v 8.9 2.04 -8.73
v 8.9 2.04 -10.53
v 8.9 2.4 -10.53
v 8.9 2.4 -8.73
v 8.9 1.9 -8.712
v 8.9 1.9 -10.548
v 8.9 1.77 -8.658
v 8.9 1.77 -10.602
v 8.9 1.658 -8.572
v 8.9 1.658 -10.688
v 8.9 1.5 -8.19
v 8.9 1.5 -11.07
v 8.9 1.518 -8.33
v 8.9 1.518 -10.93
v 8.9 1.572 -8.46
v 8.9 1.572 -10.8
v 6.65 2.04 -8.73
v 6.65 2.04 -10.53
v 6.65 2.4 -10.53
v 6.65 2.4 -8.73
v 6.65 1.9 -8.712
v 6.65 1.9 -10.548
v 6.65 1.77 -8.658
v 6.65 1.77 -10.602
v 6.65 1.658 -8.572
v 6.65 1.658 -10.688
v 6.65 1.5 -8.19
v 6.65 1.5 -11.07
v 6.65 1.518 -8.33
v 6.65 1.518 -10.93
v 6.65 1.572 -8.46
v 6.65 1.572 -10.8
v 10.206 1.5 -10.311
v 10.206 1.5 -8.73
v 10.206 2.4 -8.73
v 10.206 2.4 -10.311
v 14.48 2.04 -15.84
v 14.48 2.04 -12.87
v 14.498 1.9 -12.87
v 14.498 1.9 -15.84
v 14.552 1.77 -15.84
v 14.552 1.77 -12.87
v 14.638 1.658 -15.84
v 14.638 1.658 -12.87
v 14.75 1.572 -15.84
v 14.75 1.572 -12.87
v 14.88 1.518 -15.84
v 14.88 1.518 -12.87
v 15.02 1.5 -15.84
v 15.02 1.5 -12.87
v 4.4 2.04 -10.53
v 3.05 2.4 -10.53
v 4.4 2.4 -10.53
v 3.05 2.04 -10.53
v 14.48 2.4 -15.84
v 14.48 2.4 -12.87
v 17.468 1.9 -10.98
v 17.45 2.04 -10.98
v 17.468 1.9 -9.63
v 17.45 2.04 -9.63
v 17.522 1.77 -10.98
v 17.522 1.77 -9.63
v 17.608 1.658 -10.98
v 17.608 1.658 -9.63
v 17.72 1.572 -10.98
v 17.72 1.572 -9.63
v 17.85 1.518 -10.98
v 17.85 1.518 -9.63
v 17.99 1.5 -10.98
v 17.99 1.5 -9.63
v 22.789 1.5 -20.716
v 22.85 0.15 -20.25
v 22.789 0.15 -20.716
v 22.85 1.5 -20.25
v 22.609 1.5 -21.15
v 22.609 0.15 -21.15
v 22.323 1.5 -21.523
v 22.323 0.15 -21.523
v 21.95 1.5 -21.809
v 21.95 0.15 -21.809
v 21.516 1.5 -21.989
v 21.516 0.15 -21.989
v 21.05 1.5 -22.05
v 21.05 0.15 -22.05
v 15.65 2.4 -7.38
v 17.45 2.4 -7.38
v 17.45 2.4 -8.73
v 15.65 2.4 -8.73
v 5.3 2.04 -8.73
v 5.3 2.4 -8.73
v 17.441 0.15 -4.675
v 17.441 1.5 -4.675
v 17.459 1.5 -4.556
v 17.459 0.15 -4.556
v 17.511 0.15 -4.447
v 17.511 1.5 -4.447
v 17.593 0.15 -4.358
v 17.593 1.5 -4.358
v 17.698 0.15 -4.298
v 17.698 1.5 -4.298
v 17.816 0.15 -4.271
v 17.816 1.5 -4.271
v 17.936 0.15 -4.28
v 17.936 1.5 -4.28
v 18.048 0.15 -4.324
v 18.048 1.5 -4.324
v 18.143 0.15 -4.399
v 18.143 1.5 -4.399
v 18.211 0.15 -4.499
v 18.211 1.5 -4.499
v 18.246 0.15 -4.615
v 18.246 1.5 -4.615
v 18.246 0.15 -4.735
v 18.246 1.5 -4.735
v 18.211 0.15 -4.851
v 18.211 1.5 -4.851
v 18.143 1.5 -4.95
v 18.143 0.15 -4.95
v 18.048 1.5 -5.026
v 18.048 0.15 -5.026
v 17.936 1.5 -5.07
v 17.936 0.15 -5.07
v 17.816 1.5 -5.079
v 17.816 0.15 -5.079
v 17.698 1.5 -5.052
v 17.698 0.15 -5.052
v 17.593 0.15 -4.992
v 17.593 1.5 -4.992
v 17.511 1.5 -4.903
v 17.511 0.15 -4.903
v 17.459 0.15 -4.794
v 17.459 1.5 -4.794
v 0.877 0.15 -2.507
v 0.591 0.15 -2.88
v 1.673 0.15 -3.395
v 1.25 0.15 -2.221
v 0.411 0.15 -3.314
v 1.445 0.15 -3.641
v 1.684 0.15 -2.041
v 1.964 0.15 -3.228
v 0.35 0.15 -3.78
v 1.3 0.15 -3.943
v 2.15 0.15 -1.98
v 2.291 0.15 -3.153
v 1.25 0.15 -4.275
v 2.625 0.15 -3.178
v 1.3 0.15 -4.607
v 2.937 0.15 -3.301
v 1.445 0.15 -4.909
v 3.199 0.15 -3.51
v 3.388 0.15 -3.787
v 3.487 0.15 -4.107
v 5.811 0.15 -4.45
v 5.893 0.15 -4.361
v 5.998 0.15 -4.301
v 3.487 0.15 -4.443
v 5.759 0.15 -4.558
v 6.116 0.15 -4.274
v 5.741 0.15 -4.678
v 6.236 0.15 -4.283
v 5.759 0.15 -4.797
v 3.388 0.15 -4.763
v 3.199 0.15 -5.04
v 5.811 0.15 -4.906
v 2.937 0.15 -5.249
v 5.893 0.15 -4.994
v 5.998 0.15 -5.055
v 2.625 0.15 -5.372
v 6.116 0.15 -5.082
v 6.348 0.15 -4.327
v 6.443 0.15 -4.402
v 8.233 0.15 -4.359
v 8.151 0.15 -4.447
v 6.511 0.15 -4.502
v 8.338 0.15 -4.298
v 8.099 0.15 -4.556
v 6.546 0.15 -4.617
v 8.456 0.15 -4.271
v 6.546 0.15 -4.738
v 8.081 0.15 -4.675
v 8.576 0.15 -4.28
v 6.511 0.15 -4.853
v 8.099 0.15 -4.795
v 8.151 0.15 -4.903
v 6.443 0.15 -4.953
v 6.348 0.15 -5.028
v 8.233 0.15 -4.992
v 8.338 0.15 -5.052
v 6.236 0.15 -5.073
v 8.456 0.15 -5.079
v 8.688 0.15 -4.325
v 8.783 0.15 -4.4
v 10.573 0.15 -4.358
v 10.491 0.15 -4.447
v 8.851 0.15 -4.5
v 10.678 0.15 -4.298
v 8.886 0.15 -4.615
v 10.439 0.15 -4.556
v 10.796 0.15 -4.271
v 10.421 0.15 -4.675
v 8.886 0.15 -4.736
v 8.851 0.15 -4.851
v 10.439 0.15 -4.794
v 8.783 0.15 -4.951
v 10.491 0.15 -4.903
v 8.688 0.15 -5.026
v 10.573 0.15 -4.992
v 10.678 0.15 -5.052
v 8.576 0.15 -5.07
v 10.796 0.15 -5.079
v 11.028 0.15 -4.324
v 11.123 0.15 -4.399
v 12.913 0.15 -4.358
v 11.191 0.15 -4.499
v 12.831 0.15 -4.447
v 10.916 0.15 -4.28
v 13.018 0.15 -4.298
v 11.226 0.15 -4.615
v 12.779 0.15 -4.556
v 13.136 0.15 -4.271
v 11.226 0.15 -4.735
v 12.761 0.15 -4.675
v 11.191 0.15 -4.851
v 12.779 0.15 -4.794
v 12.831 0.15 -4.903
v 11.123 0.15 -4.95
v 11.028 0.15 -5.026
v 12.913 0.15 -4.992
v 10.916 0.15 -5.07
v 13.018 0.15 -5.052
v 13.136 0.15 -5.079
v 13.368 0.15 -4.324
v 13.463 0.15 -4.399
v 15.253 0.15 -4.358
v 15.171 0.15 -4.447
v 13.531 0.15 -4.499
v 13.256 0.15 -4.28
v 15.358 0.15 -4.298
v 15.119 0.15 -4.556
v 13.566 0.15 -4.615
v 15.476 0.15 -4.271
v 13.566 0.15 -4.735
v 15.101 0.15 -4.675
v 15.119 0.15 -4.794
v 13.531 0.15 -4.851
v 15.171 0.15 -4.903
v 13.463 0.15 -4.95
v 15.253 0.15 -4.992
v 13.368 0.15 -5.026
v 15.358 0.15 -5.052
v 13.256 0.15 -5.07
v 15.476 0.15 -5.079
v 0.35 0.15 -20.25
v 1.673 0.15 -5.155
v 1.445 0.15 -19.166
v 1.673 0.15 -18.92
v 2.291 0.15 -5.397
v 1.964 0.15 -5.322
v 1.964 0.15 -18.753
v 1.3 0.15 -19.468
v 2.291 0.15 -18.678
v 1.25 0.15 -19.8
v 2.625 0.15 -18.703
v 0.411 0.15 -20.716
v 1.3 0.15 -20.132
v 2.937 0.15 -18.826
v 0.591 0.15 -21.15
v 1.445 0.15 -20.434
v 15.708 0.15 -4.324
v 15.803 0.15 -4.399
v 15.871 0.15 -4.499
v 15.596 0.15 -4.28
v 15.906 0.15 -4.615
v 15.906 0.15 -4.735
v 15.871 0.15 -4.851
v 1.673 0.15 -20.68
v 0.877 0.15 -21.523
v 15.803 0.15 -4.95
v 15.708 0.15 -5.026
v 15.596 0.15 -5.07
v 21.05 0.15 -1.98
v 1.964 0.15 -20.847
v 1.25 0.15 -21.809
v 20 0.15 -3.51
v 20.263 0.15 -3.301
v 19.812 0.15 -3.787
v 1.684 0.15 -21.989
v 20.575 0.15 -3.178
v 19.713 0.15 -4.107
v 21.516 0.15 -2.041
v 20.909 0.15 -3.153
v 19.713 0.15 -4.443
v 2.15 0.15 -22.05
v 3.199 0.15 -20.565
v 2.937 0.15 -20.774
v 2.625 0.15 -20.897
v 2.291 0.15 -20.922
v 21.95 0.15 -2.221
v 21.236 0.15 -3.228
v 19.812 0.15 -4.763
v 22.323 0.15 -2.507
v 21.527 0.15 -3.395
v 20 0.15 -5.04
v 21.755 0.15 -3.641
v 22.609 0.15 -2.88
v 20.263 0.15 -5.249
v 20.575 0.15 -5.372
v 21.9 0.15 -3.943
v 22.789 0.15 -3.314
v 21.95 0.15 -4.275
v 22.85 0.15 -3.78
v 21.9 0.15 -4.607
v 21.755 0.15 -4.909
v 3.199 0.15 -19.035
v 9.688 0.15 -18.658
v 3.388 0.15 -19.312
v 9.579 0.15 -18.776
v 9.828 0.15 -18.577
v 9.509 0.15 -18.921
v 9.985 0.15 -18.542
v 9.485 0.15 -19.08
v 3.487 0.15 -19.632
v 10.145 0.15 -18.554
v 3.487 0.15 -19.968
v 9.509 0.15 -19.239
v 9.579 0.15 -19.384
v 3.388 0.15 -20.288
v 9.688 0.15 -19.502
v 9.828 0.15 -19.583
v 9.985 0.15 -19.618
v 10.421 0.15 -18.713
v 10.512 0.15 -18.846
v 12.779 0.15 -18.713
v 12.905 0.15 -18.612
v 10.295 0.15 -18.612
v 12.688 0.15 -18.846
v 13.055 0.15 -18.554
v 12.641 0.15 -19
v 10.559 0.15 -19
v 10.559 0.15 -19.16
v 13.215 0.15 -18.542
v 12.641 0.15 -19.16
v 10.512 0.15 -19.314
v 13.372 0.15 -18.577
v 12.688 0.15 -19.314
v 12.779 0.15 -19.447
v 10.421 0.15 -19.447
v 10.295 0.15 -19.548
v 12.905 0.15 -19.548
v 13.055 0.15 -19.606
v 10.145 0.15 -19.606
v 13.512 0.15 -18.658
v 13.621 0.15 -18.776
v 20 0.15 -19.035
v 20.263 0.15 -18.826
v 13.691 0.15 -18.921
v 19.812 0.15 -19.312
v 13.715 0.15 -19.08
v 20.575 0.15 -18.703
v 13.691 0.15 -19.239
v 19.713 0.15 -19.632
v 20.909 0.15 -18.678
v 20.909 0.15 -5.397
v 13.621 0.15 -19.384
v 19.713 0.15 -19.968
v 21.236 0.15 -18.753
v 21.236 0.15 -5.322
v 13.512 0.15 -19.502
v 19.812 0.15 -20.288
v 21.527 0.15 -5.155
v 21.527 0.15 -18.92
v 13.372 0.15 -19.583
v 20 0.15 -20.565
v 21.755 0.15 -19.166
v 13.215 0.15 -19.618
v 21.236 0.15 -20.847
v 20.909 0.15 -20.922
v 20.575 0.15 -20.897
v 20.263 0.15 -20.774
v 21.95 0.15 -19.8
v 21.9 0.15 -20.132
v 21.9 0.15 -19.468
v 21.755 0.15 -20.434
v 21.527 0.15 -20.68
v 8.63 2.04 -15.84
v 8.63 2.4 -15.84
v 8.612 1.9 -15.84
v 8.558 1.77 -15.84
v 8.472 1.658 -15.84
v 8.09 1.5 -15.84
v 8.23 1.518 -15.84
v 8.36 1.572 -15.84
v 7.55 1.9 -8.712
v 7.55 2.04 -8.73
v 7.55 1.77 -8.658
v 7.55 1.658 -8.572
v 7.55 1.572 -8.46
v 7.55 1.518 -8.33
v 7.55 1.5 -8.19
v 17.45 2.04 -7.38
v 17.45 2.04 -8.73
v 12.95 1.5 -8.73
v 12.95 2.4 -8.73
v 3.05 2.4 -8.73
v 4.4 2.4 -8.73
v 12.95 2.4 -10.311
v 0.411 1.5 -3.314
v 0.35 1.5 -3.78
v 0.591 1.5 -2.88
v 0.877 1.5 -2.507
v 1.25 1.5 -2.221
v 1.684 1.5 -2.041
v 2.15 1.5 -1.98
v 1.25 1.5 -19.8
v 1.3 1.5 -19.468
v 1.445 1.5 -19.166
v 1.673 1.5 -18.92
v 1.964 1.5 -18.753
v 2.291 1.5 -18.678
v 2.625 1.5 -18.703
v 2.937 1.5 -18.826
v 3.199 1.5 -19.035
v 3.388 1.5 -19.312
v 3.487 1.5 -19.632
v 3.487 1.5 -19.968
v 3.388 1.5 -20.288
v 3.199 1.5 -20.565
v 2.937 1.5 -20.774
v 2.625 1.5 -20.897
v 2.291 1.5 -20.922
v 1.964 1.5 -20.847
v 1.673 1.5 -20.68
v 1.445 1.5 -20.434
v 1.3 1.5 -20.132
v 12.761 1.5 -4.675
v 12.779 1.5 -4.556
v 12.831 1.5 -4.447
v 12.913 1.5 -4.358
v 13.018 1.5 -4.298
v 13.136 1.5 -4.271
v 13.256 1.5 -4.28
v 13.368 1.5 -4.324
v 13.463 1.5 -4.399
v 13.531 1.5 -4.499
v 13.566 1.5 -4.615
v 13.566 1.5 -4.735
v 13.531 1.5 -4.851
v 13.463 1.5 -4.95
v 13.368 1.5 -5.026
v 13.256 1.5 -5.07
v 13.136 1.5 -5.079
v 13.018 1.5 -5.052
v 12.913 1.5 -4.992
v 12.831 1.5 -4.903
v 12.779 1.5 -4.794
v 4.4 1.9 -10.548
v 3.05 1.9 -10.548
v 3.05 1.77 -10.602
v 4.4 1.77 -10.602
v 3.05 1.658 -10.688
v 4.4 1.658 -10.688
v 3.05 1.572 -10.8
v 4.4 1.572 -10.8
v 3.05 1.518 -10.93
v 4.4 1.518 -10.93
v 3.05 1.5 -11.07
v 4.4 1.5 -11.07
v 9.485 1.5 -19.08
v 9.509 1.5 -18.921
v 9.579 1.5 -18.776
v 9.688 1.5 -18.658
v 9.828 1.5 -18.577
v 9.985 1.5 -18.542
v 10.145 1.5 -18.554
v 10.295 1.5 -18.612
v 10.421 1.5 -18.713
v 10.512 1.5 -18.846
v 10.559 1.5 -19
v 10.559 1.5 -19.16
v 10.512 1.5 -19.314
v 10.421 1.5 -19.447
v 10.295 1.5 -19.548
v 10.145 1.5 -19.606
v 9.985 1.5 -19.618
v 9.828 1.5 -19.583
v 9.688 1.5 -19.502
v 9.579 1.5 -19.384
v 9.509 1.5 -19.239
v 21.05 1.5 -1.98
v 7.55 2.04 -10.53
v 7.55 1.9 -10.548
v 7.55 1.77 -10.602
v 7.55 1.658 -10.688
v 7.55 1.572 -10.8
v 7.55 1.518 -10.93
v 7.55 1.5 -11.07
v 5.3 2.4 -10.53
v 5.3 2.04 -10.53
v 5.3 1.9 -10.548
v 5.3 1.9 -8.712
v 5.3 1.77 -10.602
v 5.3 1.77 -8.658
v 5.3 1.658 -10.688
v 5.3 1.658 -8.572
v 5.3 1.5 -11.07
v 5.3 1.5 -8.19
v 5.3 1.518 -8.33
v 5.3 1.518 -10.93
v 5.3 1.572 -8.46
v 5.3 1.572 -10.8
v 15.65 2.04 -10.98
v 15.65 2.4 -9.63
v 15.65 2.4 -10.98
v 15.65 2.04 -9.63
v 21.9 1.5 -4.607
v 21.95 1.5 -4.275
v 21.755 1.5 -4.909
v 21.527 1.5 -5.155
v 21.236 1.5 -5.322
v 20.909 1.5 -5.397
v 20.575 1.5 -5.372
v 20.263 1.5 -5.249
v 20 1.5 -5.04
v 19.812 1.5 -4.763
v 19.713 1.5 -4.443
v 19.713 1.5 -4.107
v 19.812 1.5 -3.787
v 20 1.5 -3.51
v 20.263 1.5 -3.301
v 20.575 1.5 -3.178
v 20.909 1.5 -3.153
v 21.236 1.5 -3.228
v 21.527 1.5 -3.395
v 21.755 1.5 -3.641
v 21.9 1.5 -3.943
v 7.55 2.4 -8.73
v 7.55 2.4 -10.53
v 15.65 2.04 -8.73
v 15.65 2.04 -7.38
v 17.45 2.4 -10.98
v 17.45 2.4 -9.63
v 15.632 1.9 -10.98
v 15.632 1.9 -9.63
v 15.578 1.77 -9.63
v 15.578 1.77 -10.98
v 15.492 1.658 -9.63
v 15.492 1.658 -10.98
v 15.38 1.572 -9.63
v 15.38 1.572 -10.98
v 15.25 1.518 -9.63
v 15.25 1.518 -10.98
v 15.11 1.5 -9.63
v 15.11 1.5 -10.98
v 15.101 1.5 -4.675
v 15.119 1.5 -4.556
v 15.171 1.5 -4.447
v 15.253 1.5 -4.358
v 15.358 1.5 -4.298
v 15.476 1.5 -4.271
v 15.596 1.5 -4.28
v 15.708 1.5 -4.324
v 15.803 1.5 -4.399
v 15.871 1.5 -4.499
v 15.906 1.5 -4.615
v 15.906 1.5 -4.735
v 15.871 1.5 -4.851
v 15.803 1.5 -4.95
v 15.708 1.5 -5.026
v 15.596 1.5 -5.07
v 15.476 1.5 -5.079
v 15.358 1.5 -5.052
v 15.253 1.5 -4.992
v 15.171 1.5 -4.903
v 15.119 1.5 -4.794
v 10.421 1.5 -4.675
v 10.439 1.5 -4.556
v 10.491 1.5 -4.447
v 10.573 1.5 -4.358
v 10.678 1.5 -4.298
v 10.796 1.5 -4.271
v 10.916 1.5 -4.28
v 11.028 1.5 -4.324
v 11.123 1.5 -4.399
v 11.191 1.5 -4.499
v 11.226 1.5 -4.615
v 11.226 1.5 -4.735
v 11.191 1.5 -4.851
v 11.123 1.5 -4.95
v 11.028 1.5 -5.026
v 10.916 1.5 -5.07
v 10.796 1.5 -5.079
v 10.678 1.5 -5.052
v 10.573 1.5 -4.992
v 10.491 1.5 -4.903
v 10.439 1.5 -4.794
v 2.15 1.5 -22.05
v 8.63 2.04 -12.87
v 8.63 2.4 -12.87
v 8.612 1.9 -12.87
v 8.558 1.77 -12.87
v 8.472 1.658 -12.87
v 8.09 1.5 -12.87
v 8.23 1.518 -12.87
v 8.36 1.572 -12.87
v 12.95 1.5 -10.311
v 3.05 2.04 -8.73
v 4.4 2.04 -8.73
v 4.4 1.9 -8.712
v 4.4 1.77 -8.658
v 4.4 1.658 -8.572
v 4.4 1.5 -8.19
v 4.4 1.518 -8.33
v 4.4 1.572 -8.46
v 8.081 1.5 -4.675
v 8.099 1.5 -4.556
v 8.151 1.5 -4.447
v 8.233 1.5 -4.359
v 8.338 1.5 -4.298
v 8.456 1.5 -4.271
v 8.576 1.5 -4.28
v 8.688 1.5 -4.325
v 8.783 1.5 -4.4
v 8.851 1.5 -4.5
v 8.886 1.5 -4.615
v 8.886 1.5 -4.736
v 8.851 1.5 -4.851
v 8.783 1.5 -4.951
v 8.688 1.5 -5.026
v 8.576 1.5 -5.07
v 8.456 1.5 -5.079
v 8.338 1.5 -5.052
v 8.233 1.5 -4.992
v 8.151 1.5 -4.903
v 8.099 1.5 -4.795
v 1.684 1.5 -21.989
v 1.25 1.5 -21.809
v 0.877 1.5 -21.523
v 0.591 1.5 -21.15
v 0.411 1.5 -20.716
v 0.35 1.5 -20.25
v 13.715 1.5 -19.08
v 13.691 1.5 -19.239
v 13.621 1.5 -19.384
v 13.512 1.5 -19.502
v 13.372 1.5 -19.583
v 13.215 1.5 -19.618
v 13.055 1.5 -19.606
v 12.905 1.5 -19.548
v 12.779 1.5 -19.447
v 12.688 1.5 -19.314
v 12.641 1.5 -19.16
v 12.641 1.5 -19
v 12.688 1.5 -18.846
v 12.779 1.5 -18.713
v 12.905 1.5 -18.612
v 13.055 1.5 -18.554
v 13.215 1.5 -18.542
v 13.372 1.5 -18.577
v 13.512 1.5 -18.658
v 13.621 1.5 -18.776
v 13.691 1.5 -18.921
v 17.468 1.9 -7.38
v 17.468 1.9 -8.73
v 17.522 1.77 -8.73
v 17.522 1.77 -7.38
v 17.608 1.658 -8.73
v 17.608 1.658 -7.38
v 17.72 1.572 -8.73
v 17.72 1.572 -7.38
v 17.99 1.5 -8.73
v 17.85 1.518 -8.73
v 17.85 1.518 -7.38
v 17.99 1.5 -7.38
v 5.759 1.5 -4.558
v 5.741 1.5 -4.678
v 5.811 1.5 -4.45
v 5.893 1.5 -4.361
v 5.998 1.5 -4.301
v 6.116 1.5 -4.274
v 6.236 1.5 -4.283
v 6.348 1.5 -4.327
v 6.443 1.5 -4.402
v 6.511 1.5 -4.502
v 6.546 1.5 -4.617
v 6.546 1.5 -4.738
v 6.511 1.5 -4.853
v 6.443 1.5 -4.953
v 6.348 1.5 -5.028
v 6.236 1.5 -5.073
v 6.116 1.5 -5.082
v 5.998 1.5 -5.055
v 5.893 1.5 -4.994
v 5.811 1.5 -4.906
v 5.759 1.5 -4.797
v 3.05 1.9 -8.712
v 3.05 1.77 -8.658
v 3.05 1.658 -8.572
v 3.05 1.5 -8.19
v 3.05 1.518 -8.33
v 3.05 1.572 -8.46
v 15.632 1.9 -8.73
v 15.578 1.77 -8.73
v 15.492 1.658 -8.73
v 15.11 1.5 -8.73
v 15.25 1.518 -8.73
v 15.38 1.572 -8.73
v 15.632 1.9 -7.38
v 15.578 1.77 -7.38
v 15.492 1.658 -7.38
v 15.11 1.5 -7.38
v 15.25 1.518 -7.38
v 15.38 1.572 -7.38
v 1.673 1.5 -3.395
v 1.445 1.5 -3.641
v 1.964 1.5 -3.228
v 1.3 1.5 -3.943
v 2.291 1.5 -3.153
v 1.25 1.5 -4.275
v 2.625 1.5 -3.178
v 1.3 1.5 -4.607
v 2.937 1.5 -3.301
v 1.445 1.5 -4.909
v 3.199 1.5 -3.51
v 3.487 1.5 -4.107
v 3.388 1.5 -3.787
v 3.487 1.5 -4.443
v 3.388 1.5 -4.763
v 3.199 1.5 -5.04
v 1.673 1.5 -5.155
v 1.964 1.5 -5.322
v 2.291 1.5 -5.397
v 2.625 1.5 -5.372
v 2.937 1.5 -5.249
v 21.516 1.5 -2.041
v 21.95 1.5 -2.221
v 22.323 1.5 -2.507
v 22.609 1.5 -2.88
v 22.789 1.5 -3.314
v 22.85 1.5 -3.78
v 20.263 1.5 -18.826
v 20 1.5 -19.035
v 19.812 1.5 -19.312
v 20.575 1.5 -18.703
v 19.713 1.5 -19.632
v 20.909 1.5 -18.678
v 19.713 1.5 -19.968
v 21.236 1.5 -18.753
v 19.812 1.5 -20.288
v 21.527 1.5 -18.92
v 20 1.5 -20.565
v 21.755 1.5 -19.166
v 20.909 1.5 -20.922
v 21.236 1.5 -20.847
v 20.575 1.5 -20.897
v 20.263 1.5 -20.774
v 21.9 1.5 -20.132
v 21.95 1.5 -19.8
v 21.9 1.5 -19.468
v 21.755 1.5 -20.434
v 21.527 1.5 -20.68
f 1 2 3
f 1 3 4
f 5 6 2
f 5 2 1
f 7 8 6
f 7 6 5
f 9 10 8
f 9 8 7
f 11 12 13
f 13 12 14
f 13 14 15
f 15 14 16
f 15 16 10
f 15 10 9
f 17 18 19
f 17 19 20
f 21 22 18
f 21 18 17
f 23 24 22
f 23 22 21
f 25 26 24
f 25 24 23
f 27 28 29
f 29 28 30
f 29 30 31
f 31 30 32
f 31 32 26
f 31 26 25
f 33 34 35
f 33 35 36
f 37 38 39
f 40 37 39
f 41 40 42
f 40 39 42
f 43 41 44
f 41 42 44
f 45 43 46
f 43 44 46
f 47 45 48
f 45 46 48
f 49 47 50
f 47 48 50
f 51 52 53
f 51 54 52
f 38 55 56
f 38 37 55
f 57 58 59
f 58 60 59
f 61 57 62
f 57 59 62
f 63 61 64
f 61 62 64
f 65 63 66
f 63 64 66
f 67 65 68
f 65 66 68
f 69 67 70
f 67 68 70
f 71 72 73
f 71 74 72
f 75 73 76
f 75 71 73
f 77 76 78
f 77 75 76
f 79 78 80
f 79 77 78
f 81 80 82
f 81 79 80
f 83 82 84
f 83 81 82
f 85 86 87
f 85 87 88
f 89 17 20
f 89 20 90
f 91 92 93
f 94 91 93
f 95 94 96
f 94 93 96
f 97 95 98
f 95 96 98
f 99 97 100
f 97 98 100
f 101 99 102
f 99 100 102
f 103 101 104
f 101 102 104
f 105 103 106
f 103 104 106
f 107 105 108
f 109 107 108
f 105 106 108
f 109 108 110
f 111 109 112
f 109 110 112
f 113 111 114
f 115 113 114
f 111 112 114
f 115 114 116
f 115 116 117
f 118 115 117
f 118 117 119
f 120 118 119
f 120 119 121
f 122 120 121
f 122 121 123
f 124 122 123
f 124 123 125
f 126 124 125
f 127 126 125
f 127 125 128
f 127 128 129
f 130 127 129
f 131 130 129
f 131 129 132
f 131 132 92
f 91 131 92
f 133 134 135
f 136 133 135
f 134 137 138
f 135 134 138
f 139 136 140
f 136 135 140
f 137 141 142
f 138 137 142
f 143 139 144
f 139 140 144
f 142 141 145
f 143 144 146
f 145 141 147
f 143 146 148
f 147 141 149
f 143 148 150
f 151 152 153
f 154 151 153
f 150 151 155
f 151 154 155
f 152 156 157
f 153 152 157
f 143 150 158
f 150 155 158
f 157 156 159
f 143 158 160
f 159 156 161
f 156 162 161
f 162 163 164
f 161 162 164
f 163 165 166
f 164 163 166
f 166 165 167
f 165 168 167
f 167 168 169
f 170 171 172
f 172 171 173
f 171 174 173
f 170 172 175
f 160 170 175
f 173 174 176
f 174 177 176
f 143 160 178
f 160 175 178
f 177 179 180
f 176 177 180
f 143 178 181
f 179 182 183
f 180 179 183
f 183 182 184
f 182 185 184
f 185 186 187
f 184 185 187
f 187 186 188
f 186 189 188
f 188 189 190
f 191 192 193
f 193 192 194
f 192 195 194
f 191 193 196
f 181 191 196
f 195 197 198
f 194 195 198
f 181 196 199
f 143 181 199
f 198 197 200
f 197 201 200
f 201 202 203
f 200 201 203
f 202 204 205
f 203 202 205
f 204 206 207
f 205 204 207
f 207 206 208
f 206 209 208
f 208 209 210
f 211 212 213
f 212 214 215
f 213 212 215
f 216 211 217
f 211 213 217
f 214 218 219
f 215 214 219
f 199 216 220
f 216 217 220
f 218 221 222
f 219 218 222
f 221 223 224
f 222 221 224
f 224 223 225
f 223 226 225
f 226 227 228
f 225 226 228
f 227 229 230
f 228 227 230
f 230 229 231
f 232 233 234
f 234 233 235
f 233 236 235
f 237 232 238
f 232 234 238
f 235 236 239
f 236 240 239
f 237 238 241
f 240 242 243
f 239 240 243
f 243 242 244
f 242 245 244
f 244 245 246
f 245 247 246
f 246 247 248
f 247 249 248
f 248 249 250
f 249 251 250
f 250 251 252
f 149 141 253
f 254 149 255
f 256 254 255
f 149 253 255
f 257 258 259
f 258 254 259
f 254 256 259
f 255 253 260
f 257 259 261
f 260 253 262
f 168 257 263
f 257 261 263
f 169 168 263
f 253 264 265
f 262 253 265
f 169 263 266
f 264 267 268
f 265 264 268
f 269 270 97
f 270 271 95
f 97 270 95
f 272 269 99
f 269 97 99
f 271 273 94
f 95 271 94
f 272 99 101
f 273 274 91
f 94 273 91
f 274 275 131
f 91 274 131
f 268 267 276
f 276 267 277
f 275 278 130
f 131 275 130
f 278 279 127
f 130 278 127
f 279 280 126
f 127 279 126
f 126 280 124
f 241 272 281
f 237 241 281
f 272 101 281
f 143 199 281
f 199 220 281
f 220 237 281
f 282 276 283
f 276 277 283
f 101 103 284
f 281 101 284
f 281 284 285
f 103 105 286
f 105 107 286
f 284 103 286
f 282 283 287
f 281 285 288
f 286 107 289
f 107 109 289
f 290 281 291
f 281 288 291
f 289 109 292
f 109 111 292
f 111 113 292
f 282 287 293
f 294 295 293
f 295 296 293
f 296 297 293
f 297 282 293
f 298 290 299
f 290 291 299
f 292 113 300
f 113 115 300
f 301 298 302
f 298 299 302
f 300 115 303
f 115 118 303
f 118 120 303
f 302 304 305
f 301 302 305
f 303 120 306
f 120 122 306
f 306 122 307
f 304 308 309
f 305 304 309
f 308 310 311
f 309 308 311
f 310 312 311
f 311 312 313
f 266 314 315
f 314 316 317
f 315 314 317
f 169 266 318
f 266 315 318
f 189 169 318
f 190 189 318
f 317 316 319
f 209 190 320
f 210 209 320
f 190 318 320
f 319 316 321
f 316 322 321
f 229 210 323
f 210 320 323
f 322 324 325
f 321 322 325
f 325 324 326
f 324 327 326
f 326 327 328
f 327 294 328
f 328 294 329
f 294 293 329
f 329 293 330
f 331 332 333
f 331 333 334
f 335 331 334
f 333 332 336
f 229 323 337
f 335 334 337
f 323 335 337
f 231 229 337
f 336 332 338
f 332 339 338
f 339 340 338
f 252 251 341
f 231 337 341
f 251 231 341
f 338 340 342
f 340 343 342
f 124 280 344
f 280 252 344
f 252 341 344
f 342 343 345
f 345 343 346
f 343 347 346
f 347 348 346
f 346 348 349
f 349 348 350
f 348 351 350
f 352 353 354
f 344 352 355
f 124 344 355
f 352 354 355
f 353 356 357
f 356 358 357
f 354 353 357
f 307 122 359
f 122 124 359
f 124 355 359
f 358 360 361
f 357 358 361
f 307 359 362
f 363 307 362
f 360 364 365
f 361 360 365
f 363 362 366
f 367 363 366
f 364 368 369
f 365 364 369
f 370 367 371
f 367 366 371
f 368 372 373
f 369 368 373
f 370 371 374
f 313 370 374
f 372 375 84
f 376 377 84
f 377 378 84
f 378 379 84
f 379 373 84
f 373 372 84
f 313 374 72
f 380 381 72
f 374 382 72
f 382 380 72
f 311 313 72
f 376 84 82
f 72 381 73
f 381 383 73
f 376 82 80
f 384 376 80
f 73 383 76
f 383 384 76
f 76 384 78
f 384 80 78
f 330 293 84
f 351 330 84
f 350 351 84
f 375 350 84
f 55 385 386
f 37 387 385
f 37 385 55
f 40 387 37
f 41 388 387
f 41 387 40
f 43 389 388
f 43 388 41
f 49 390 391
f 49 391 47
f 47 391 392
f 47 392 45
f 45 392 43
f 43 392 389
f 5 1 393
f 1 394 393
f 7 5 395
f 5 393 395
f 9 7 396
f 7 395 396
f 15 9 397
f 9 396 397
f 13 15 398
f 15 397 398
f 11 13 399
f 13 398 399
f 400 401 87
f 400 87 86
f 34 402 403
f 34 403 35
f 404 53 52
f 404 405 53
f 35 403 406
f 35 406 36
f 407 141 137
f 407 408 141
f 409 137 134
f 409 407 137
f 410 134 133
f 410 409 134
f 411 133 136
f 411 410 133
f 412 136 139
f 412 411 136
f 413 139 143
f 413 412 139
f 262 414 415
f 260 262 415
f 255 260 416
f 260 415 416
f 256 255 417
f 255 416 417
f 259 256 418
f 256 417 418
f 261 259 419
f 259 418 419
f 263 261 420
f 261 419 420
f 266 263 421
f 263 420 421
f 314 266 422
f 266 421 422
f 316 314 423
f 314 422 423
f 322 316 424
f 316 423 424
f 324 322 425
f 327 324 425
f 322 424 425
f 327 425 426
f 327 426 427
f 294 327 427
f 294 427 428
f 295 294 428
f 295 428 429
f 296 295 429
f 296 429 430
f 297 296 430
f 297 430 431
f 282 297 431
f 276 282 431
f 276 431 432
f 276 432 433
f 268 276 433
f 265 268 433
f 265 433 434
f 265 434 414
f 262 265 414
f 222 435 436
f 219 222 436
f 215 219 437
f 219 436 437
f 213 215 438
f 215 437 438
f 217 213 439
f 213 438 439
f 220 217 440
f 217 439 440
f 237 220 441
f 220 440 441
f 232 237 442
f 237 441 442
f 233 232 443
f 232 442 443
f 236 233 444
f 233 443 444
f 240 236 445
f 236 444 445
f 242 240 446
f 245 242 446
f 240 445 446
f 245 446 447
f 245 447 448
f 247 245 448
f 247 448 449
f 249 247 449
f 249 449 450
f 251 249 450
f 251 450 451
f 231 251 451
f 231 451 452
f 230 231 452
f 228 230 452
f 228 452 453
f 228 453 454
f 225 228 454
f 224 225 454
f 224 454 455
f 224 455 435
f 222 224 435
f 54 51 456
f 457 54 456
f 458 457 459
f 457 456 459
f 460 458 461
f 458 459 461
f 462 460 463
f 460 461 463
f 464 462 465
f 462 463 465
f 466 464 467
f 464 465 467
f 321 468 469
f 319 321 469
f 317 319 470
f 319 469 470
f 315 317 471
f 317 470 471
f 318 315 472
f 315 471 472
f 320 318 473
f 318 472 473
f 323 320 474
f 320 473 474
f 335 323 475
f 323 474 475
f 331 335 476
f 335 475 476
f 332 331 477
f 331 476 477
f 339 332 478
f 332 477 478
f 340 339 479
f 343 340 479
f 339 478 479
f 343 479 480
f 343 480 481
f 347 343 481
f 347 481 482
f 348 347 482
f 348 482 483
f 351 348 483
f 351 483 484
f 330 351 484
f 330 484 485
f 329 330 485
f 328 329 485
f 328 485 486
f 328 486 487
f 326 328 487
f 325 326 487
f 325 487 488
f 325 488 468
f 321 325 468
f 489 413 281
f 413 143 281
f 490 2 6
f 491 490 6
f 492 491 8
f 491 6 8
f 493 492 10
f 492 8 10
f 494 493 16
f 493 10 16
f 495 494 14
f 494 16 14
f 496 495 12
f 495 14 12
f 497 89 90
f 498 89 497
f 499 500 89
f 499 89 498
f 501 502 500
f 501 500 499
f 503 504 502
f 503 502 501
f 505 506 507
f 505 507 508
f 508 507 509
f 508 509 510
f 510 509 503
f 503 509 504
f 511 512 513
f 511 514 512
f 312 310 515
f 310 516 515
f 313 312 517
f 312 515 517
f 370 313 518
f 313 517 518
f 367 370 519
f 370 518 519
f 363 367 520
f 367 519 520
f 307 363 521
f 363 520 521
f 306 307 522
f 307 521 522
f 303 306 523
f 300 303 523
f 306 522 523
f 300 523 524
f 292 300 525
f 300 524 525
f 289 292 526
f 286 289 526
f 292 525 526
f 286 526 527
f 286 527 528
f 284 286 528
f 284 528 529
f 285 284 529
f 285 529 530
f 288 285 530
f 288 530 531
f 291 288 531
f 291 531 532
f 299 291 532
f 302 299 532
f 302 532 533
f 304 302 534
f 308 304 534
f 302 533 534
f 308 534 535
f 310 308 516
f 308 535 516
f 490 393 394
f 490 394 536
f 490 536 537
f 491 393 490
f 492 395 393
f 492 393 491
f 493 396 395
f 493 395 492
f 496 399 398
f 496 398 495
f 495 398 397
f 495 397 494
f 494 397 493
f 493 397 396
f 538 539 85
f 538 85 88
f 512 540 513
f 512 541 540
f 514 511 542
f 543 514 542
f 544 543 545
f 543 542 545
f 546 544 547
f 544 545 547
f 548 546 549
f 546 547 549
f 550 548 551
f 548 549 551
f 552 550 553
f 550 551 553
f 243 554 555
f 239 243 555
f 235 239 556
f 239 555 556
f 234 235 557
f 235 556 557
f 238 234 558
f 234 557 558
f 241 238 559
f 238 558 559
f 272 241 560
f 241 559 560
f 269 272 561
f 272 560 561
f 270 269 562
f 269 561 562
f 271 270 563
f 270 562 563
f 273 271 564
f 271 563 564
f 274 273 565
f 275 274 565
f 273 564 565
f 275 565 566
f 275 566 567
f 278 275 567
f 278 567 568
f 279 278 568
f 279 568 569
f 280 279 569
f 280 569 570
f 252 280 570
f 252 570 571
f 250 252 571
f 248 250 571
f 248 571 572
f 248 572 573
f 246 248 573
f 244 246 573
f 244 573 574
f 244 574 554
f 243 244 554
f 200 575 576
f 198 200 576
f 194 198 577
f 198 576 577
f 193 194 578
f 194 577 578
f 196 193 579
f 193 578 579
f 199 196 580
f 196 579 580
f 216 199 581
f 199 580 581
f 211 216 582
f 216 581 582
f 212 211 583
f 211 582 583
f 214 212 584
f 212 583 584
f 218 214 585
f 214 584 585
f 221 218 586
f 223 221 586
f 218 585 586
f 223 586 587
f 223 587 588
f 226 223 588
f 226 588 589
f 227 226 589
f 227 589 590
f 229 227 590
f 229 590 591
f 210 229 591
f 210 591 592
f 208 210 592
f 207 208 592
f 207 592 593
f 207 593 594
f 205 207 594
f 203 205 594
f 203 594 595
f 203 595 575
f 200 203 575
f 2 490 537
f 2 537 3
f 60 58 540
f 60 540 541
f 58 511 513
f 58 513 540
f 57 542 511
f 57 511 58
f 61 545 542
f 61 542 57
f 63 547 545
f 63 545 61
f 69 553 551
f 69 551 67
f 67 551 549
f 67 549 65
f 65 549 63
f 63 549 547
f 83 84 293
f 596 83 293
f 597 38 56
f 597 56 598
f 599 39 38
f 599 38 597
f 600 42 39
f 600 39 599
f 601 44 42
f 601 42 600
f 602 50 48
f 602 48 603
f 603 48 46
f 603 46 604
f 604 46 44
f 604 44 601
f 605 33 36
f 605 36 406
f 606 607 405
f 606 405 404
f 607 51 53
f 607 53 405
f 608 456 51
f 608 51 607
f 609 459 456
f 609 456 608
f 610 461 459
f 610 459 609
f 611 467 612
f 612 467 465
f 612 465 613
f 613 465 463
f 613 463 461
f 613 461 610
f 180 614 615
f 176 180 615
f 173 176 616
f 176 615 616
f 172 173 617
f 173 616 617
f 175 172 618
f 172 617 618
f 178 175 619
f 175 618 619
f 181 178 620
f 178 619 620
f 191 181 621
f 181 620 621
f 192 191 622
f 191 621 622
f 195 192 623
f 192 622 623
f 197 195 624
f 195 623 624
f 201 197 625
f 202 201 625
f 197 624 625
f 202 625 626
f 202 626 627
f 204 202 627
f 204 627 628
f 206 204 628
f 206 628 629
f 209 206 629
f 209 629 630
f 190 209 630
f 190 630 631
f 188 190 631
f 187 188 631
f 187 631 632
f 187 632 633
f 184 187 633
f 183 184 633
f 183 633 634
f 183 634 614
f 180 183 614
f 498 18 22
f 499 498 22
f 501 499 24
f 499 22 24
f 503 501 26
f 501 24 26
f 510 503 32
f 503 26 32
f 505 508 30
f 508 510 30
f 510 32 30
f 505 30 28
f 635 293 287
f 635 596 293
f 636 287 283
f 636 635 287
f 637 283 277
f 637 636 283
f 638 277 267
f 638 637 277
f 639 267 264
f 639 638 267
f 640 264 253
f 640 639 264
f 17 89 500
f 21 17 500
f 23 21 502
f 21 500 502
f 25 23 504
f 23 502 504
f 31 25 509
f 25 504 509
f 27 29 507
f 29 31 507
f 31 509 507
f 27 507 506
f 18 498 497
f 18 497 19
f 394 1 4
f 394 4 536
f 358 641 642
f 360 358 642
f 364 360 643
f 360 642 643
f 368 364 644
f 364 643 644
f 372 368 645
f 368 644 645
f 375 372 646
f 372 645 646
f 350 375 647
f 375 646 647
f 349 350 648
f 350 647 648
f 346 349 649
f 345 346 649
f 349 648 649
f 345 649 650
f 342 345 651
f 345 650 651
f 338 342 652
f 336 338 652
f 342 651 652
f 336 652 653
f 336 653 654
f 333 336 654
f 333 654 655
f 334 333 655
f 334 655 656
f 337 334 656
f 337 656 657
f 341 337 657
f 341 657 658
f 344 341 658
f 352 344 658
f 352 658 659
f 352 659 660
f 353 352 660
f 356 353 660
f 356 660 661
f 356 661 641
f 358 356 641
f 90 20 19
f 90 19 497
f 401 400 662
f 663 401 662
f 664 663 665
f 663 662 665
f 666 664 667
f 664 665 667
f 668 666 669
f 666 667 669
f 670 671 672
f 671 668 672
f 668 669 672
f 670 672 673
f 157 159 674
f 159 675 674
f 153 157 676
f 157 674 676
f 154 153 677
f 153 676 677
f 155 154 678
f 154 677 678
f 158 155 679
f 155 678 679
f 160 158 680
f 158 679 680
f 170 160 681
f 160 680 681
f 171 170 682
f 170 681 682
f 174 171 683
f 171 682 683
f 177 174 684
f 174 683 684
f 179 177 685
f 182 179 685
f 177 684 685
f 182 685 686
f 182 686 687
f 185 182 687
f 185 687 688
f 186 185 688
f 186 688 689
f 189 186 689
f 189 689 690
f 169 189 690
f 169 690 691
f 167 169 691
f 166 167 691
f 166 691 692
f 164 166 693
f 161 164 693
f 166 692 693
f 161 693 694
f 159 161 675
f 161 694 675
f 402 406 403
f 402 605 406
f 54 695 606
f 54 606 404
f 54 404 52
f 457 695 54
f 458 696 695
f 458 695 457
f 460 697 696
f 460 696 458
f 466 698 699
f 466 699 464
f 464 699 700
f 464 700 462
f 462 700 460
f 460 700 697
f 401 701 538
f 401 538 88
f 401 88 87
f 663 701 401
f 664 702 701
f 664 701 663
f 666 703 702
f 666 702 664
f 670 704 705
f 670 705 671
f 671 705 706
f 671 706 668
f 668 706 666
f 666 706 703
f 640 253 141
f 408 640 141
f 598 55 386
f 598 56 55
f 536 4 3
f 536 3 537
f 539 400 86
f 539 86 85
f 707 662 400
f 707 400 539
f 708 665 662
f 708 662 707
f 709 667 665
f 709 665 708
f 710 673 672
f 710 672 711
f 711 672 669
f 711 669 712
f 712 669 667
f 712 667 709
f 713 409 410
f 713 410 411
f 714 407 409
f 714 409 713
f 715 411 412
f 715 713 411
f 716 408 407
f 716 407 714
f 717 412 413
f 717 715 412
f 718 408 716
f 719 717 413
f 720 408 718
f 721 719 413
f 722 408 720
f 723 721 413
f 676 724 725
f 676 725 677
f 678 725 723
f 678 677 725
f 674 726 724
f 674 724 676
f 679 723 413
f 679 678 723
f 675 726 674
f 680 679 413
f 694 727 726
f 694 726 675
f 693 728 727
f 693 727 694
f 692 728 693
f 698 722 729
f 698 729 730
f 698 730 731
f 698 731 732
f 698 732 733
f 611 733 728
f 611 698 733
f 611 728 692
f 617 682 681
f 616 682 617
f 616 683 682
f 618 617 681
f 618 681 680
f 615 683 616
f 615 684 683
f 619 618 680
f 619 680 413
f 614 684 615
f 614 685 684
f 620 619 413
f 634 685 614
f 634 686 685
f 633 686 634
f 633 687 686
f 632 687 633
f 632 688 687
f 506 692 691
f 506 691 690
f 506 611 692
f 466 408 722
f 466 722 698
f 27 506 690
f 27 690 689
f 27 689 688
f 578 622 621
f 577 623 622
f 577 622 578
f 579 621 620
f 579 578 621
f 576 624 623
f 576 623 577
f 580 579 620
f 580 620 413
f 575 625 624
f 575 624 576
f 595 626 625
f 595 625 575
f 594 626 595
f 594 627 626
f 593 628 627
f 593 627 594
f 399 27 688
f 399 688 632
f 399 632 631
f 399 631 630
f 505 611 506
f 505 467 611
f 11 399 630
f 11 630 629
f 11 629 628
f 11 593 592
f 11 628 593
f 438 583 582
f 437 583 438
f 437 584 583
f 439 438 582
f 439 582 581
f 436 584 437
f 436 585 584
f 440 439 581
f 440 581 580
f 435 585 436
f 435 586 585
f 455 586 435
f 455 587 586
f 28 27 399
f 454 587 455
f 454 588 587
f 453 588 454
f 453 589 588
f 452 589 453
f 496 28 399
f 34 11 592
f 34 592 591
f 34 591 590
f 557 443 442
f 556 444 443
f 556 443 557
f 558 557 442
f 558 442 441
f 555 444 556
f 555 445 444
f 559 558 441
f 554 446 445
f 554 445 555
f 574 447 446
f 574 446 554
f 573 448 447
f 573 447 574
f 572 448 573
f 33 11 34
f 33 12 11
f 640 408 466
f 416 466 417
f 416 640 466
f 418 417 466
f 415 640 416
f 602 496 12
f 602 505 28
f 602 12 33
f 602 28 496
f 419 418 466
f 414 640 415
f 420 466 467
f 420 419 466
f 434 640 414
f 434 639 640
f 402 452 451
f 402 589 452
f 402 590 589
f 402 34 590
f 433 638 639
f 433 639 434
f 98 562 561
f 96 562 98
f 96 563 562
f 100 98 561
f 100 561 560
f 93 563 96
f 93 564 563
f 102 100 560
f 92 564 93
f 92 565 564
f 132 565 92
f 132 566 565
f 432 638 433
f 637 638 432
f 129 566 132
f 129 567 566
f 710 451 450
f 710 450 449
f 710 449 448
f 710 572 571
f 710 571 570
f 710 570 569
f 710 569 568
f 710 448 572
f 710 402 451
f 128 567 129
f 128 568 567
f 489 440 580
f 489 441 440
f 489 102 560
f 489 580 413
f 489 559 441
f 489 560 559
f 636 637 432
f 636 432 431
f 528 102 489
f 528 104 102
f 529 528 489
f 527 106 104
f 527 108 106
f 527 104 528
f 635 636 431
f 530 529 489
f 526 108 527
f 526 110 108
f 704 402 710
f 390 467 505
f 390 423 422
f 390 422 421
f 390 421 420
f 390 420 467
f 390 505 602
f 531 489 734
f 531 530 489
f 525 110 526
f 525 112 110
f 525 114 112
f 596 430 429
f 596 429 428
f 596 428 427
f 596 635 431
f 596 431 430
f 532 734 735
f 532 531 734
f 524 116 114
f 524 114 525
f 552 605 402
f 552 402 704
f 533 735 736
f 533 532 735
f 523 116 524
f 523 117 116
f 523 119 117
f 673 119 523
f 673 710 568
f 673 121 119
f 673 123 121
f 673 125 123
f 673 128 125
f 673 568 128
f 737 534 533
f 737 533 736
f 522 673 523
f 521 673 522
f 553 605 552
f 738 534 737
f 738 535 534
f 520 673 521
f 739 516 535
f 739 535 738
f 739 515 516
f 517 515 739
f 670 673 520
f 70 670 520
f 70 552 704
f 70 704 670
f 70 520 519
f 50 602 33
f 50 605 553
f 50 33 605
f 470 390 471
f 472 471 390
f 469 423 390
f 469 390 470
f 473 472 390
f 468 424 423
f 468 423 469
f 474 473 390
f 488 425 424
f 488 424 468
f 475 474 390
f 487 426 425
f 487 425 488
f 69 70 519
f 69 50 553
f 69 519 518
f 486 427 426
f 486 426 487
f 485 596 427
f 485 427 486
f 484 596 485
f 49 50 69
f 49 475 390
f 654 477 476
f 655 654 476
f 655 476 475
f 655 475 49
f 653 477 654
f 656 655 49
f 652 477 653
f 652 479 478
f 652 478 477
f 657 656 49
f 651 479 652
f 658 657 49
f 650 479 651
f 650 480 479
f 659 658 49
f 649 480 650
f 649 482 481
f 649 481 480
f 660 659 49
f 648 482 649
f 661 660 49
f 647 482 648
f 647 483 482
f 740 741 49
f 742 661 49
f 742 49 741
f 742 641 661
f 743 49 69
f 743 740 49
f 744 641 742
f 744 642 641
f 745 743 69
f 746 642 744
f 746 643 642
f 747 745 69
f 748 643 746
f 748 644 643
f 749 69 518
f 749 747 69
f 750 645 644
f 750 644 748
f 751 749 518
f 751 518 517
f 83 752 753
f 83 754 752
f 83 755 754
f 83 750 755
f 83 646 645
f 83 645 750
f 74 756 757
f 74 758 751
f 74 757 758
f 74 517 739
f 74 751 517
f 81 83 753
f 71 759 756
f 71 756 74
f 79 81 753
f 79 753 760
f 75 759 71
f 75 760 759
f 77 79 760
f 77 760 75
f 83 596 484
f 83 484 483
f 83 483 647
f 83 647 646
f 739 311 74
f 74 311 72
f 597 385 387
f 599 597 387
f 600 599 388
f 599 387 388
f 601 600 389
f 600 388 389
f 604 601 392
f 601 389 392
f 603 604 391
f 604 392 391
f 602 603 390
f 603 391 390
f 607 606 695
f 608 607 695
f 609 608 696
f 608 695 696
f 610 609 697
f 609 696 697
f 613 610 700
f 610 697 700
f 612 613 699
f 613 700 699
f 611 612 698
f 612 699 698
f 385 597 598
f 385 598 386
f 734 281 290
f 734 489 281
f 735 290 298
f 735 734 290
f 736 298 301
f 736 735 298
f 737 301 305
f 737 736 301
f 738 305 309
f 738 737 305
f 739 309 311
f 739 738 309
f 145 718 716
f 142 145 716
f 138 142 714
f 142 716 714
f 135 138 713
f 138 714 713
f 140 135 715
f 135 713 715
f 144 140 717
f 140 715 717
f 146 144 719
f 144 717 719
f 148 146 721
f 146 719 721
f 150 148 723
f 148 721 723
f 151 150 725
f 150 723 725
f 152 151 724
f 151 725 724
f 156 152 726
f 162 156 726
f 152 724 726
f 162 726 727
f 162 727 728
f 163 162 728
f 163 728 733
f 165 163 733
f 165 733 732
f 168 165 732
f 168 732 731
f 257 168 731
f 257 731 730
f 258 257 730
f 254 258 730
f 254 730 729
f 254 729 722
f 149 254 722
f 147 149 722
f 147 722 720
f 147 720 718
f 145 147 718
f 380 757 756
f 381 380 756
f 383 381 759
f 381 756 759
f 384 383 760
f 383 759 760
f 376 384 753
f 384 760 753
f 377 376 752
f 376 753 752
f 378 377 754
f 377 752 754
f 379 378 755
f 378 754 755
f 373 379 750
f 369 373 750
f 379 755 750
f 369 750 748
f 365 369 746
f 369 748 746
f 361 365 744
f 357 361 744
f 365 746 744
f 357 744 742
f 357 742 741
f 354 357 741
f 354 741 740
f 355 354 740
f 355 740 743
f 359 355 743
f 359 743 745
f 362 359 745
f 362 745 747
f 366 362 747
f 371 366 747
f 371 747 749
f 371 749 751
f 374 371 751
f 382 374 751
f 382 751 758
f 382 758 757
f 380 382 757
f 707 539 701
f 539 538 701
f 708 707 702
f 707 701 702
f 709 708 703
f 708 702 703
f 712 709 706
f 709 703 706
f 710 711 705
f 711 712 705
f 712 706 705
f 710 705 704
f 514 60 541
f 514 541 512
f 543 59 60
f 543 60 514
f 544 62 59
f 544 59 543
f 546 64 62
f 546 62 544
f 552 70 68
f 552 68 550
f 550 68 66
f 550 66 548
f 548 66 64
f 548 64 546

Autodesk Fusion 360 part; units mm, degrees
sketch "Sketch1" plane through (0, 0, 0) normal (0, 1, 0) x (1, 0, 0)
  line L0 (0, 0) -> (25, 0)
  line L1 (25, 0) -> (25, 22.3)
  line L2 (25, 22.3) -> (0, 22.3)
  line L3 (0, 22.3) -> (0, 0)
  dimension "d1" = 25
  dimension "d2" = 22.3
extrude "Extrude1" add sketch "Sketch1" along normal blind 1.5
fillet "Fillet1" radius 2 4 edges at (25, 0.75, 0) (25, 0.75, -22.3) (0, 0.75, -22.3) (0, 0.75, 0)
sketch "Sketch2" plane through (0, 1.5, 0) normal (0, 1, 0) x (-1, 0, 0)
  arc A0 (0, -2) -> (-2, 0) centre (-2, -2) ccw
  line L0 (-2, 0) -> (-23, 0)
  arc A1 (-23, 0) -> (-25, -2) centre (-23, -2) ccw
  line L1 (-25, -2) -> (-25, -20.3)
  arc A2 (-25, -20.3) -> (-23, -22.3) centre (-23, -20.3) ccw
  line L2 (-23, -22.3) -> (-2, -22.3)
  arc A3 (-2, -22.3) -> (0, -20.3) centre (-2, -20.3) ccw
  line L3 (0, -20.3) -> (0, -2)
  line L4 (0, 0) -> (-2.25, 0)
  line L5 (-2.25, 0) -> (-2.2498, -2.55)
  circle A4 centre (-2.2498, -2.55) radius 1.25
  line L6 (-2.2498, -2.55) -> (-2.2499, -1.275)
  line L7 (-2.2498, -2.55) -> (-2.2498, -19.8)
  circle A5 centre (-2.2498, -19.8) radius 1.25
  line L8 (0, 0) -> (-6.5, 0)
  line L9 (-6.5, 0) -> (-6.5, -0.4982)
  circle A6 centre (-6.44, -2.9975) radius 0.45
  line L10 (-6.44, -2.9975) -> (-9.04, -2.9948)
  circle A7 centre (-9.04, -2.9948) radius 0.45
  line L11 (-9.04, -2.9948) -> (-11.64, -2.9944)
  circle A8 centre (-11.64, -2.9944) radius 0.45
  line L12 (0, 0) -> (-10.75, 0)
  line L13 (-10.75, 0) -> (-10.75, -19)
  circle A9 centre (-10.75, -19) radius 0.6
  line L14 (-9.2, -15.4) -> (-15.7, -15.4)
  line L15 (-15.7, -15.4) -> (-15.7, -12.1)
  line L16 (-15.7, -12.1) -> (-9.2, -12.1)
  line L17 (-9.2, -12.1) -> (-9.2, -15.4)
  line L18 (-3, -9.5) -> (-4.5, -9.5)
  line L19 (-4.5, -9.5) -> (-4.5, -7.5)
  line L20 (-4.5, -7.5) -> (-3, -7.5)
  line L21 (-3, -7.5) -> (-3, -9.5)
  line L22 (-5.5, -9.5) -> (-7, -9.5)
  line L23 (-7, -9.5) -> (-7, -7.5)
  line L24 (-7, -7.5) -> (-5.5, -7.5)
  line L25 (-5.5, -7.5) -> (-5.5, -9.5)
  line L26 (-8, -9.5) -> (-9.5, -9.5)
  line L27 (-9.5, -9.5) -> (-9.5, -7.5)
  line L28 (-9.5, -7.5) -> (-8, -7.5)
  line L29 (-8, -7.5) -> (-8, -9.5)
  line L30 (-14, -7.5) -> (-10.9513, -7.5)
  line L31 (-10.9513, -7.5) -> (-10.9513, -9.2569)
  line L32 (-10.9513, -9.2569) -> (-14, -9.2569)
  line L33 (-14, -9.2569) -> (-14, -7.5)
  line L34 (-17, -10) -> (-19, -10)
  line L35 (-19, -10) -> (-19, -8.5)
  line L36 (-19, -8.5) -> (-17, -8.5)
  line L37 (-17, -8.5) -> (-17, -10)
  line L38 (-17, -7.5) -> (-19, -7.5)
  line L39 (-19, -7.5) -> (-19, -6)
  line L40 (-19, -6) -> (-17, -6)
  line L41 (-17, -6) -> (-17, -7.5)
  line L42 (-11.64, -2.9944) -> (-14.24, -2.9944)
  line L43 (-14.24, -2.9944) -> (-16.84, -2.9944)
  line L44 (-16.84, -2.9944) -> (-19.44, -2.9944)
  circle A10 centre (-14.24, -2.9944) radius 0.45
  circle A11 centre (-16.84, -2.9944) radius 0.45
  circle A12 centre (-19.44, -2.9944) radius 0.45
  dimension "d6" = 2.25
  dimension "d7" = 2.55
  dimension "d8" = 2.5
  dimension "d9" = 17.25
  dimension "d10" = 2.5
  dimension "d11" = 6.5
  dimension "d12" = 2.5
  dimension "d13" = 0.9
  dimension "d14" = 6.5
  dimension "d15" = 2.6
  dimension "d16" = 0.9
  dimension "d17" = 2.6
  dimension "d18" = 0.9
  dimension "d22" = 10.75
  dimension "d23" = 19
  dimension "d24" = 1.2
  dimension "d28" = 2.6
  dimension "d29" = 2.6
  dimension "d30" = 2.6
  dimension "d31" = 0.9
  dimension "d32" = 0.9
  dimension "d33" = 0.9
extrude "Extrude2" cut sketch "Sketch2" against normal blind 5 contours A5 | L5 A4 L6 L7 | L5 A4 L6 L7 | A9
ref_plane "WorkPlane1" through (12.5, 0.75, -11.15) normal (-1, 0, 0) x (0, 0, 1)
mirror "Mirror1" about plane through (12.5, 0.75, -11.15) normal (-1, 0, 0) of "Extrude2"
extrude "Extrude3" add sketch "Sketch2" along normal blind 1 contours L13 L14 L16 L17 | L13 L14 L15 L16 | L18 L19 L20 L21 | L22 L23 L24 L25 | L26 L27 L28 L29 | L30 L31 L32 L33 | L34 L35 L36 L37 | L38 L39 L40 L41
fillet "Fillet2" radius 0.6 12 edges at (9.2, 1.5, -13.75) (15.7, 1.5, -13.75) (8.75, 1.5, -7.5) (8.75, 1.5, -9.5) (6.25, 1.5, -7.5) (6.25, 1.5, -9.5) (3.75, 1.5, -9.5) (3.75, 1.5, -7.5) (19, 1.5, -9.25) (17, 1.5, -9.25) (17, 1.5, -6.75) (19, 1.5, -6.75)
extrude "Extrude4" cut sketch "Sketch2" against normal blind 4 contours A6 | L10 A7 L11 | L10 A7 L11 | A12 | L43 L44 A11 | L43 L44 A11 | L42 L43 A10 | L42 L43 A10 | L11 A8 L42 | L11 A8 L42
scale "Maßstab1" factor 0.9 about (3.4998, 1.5, -19.8) bodies 1
